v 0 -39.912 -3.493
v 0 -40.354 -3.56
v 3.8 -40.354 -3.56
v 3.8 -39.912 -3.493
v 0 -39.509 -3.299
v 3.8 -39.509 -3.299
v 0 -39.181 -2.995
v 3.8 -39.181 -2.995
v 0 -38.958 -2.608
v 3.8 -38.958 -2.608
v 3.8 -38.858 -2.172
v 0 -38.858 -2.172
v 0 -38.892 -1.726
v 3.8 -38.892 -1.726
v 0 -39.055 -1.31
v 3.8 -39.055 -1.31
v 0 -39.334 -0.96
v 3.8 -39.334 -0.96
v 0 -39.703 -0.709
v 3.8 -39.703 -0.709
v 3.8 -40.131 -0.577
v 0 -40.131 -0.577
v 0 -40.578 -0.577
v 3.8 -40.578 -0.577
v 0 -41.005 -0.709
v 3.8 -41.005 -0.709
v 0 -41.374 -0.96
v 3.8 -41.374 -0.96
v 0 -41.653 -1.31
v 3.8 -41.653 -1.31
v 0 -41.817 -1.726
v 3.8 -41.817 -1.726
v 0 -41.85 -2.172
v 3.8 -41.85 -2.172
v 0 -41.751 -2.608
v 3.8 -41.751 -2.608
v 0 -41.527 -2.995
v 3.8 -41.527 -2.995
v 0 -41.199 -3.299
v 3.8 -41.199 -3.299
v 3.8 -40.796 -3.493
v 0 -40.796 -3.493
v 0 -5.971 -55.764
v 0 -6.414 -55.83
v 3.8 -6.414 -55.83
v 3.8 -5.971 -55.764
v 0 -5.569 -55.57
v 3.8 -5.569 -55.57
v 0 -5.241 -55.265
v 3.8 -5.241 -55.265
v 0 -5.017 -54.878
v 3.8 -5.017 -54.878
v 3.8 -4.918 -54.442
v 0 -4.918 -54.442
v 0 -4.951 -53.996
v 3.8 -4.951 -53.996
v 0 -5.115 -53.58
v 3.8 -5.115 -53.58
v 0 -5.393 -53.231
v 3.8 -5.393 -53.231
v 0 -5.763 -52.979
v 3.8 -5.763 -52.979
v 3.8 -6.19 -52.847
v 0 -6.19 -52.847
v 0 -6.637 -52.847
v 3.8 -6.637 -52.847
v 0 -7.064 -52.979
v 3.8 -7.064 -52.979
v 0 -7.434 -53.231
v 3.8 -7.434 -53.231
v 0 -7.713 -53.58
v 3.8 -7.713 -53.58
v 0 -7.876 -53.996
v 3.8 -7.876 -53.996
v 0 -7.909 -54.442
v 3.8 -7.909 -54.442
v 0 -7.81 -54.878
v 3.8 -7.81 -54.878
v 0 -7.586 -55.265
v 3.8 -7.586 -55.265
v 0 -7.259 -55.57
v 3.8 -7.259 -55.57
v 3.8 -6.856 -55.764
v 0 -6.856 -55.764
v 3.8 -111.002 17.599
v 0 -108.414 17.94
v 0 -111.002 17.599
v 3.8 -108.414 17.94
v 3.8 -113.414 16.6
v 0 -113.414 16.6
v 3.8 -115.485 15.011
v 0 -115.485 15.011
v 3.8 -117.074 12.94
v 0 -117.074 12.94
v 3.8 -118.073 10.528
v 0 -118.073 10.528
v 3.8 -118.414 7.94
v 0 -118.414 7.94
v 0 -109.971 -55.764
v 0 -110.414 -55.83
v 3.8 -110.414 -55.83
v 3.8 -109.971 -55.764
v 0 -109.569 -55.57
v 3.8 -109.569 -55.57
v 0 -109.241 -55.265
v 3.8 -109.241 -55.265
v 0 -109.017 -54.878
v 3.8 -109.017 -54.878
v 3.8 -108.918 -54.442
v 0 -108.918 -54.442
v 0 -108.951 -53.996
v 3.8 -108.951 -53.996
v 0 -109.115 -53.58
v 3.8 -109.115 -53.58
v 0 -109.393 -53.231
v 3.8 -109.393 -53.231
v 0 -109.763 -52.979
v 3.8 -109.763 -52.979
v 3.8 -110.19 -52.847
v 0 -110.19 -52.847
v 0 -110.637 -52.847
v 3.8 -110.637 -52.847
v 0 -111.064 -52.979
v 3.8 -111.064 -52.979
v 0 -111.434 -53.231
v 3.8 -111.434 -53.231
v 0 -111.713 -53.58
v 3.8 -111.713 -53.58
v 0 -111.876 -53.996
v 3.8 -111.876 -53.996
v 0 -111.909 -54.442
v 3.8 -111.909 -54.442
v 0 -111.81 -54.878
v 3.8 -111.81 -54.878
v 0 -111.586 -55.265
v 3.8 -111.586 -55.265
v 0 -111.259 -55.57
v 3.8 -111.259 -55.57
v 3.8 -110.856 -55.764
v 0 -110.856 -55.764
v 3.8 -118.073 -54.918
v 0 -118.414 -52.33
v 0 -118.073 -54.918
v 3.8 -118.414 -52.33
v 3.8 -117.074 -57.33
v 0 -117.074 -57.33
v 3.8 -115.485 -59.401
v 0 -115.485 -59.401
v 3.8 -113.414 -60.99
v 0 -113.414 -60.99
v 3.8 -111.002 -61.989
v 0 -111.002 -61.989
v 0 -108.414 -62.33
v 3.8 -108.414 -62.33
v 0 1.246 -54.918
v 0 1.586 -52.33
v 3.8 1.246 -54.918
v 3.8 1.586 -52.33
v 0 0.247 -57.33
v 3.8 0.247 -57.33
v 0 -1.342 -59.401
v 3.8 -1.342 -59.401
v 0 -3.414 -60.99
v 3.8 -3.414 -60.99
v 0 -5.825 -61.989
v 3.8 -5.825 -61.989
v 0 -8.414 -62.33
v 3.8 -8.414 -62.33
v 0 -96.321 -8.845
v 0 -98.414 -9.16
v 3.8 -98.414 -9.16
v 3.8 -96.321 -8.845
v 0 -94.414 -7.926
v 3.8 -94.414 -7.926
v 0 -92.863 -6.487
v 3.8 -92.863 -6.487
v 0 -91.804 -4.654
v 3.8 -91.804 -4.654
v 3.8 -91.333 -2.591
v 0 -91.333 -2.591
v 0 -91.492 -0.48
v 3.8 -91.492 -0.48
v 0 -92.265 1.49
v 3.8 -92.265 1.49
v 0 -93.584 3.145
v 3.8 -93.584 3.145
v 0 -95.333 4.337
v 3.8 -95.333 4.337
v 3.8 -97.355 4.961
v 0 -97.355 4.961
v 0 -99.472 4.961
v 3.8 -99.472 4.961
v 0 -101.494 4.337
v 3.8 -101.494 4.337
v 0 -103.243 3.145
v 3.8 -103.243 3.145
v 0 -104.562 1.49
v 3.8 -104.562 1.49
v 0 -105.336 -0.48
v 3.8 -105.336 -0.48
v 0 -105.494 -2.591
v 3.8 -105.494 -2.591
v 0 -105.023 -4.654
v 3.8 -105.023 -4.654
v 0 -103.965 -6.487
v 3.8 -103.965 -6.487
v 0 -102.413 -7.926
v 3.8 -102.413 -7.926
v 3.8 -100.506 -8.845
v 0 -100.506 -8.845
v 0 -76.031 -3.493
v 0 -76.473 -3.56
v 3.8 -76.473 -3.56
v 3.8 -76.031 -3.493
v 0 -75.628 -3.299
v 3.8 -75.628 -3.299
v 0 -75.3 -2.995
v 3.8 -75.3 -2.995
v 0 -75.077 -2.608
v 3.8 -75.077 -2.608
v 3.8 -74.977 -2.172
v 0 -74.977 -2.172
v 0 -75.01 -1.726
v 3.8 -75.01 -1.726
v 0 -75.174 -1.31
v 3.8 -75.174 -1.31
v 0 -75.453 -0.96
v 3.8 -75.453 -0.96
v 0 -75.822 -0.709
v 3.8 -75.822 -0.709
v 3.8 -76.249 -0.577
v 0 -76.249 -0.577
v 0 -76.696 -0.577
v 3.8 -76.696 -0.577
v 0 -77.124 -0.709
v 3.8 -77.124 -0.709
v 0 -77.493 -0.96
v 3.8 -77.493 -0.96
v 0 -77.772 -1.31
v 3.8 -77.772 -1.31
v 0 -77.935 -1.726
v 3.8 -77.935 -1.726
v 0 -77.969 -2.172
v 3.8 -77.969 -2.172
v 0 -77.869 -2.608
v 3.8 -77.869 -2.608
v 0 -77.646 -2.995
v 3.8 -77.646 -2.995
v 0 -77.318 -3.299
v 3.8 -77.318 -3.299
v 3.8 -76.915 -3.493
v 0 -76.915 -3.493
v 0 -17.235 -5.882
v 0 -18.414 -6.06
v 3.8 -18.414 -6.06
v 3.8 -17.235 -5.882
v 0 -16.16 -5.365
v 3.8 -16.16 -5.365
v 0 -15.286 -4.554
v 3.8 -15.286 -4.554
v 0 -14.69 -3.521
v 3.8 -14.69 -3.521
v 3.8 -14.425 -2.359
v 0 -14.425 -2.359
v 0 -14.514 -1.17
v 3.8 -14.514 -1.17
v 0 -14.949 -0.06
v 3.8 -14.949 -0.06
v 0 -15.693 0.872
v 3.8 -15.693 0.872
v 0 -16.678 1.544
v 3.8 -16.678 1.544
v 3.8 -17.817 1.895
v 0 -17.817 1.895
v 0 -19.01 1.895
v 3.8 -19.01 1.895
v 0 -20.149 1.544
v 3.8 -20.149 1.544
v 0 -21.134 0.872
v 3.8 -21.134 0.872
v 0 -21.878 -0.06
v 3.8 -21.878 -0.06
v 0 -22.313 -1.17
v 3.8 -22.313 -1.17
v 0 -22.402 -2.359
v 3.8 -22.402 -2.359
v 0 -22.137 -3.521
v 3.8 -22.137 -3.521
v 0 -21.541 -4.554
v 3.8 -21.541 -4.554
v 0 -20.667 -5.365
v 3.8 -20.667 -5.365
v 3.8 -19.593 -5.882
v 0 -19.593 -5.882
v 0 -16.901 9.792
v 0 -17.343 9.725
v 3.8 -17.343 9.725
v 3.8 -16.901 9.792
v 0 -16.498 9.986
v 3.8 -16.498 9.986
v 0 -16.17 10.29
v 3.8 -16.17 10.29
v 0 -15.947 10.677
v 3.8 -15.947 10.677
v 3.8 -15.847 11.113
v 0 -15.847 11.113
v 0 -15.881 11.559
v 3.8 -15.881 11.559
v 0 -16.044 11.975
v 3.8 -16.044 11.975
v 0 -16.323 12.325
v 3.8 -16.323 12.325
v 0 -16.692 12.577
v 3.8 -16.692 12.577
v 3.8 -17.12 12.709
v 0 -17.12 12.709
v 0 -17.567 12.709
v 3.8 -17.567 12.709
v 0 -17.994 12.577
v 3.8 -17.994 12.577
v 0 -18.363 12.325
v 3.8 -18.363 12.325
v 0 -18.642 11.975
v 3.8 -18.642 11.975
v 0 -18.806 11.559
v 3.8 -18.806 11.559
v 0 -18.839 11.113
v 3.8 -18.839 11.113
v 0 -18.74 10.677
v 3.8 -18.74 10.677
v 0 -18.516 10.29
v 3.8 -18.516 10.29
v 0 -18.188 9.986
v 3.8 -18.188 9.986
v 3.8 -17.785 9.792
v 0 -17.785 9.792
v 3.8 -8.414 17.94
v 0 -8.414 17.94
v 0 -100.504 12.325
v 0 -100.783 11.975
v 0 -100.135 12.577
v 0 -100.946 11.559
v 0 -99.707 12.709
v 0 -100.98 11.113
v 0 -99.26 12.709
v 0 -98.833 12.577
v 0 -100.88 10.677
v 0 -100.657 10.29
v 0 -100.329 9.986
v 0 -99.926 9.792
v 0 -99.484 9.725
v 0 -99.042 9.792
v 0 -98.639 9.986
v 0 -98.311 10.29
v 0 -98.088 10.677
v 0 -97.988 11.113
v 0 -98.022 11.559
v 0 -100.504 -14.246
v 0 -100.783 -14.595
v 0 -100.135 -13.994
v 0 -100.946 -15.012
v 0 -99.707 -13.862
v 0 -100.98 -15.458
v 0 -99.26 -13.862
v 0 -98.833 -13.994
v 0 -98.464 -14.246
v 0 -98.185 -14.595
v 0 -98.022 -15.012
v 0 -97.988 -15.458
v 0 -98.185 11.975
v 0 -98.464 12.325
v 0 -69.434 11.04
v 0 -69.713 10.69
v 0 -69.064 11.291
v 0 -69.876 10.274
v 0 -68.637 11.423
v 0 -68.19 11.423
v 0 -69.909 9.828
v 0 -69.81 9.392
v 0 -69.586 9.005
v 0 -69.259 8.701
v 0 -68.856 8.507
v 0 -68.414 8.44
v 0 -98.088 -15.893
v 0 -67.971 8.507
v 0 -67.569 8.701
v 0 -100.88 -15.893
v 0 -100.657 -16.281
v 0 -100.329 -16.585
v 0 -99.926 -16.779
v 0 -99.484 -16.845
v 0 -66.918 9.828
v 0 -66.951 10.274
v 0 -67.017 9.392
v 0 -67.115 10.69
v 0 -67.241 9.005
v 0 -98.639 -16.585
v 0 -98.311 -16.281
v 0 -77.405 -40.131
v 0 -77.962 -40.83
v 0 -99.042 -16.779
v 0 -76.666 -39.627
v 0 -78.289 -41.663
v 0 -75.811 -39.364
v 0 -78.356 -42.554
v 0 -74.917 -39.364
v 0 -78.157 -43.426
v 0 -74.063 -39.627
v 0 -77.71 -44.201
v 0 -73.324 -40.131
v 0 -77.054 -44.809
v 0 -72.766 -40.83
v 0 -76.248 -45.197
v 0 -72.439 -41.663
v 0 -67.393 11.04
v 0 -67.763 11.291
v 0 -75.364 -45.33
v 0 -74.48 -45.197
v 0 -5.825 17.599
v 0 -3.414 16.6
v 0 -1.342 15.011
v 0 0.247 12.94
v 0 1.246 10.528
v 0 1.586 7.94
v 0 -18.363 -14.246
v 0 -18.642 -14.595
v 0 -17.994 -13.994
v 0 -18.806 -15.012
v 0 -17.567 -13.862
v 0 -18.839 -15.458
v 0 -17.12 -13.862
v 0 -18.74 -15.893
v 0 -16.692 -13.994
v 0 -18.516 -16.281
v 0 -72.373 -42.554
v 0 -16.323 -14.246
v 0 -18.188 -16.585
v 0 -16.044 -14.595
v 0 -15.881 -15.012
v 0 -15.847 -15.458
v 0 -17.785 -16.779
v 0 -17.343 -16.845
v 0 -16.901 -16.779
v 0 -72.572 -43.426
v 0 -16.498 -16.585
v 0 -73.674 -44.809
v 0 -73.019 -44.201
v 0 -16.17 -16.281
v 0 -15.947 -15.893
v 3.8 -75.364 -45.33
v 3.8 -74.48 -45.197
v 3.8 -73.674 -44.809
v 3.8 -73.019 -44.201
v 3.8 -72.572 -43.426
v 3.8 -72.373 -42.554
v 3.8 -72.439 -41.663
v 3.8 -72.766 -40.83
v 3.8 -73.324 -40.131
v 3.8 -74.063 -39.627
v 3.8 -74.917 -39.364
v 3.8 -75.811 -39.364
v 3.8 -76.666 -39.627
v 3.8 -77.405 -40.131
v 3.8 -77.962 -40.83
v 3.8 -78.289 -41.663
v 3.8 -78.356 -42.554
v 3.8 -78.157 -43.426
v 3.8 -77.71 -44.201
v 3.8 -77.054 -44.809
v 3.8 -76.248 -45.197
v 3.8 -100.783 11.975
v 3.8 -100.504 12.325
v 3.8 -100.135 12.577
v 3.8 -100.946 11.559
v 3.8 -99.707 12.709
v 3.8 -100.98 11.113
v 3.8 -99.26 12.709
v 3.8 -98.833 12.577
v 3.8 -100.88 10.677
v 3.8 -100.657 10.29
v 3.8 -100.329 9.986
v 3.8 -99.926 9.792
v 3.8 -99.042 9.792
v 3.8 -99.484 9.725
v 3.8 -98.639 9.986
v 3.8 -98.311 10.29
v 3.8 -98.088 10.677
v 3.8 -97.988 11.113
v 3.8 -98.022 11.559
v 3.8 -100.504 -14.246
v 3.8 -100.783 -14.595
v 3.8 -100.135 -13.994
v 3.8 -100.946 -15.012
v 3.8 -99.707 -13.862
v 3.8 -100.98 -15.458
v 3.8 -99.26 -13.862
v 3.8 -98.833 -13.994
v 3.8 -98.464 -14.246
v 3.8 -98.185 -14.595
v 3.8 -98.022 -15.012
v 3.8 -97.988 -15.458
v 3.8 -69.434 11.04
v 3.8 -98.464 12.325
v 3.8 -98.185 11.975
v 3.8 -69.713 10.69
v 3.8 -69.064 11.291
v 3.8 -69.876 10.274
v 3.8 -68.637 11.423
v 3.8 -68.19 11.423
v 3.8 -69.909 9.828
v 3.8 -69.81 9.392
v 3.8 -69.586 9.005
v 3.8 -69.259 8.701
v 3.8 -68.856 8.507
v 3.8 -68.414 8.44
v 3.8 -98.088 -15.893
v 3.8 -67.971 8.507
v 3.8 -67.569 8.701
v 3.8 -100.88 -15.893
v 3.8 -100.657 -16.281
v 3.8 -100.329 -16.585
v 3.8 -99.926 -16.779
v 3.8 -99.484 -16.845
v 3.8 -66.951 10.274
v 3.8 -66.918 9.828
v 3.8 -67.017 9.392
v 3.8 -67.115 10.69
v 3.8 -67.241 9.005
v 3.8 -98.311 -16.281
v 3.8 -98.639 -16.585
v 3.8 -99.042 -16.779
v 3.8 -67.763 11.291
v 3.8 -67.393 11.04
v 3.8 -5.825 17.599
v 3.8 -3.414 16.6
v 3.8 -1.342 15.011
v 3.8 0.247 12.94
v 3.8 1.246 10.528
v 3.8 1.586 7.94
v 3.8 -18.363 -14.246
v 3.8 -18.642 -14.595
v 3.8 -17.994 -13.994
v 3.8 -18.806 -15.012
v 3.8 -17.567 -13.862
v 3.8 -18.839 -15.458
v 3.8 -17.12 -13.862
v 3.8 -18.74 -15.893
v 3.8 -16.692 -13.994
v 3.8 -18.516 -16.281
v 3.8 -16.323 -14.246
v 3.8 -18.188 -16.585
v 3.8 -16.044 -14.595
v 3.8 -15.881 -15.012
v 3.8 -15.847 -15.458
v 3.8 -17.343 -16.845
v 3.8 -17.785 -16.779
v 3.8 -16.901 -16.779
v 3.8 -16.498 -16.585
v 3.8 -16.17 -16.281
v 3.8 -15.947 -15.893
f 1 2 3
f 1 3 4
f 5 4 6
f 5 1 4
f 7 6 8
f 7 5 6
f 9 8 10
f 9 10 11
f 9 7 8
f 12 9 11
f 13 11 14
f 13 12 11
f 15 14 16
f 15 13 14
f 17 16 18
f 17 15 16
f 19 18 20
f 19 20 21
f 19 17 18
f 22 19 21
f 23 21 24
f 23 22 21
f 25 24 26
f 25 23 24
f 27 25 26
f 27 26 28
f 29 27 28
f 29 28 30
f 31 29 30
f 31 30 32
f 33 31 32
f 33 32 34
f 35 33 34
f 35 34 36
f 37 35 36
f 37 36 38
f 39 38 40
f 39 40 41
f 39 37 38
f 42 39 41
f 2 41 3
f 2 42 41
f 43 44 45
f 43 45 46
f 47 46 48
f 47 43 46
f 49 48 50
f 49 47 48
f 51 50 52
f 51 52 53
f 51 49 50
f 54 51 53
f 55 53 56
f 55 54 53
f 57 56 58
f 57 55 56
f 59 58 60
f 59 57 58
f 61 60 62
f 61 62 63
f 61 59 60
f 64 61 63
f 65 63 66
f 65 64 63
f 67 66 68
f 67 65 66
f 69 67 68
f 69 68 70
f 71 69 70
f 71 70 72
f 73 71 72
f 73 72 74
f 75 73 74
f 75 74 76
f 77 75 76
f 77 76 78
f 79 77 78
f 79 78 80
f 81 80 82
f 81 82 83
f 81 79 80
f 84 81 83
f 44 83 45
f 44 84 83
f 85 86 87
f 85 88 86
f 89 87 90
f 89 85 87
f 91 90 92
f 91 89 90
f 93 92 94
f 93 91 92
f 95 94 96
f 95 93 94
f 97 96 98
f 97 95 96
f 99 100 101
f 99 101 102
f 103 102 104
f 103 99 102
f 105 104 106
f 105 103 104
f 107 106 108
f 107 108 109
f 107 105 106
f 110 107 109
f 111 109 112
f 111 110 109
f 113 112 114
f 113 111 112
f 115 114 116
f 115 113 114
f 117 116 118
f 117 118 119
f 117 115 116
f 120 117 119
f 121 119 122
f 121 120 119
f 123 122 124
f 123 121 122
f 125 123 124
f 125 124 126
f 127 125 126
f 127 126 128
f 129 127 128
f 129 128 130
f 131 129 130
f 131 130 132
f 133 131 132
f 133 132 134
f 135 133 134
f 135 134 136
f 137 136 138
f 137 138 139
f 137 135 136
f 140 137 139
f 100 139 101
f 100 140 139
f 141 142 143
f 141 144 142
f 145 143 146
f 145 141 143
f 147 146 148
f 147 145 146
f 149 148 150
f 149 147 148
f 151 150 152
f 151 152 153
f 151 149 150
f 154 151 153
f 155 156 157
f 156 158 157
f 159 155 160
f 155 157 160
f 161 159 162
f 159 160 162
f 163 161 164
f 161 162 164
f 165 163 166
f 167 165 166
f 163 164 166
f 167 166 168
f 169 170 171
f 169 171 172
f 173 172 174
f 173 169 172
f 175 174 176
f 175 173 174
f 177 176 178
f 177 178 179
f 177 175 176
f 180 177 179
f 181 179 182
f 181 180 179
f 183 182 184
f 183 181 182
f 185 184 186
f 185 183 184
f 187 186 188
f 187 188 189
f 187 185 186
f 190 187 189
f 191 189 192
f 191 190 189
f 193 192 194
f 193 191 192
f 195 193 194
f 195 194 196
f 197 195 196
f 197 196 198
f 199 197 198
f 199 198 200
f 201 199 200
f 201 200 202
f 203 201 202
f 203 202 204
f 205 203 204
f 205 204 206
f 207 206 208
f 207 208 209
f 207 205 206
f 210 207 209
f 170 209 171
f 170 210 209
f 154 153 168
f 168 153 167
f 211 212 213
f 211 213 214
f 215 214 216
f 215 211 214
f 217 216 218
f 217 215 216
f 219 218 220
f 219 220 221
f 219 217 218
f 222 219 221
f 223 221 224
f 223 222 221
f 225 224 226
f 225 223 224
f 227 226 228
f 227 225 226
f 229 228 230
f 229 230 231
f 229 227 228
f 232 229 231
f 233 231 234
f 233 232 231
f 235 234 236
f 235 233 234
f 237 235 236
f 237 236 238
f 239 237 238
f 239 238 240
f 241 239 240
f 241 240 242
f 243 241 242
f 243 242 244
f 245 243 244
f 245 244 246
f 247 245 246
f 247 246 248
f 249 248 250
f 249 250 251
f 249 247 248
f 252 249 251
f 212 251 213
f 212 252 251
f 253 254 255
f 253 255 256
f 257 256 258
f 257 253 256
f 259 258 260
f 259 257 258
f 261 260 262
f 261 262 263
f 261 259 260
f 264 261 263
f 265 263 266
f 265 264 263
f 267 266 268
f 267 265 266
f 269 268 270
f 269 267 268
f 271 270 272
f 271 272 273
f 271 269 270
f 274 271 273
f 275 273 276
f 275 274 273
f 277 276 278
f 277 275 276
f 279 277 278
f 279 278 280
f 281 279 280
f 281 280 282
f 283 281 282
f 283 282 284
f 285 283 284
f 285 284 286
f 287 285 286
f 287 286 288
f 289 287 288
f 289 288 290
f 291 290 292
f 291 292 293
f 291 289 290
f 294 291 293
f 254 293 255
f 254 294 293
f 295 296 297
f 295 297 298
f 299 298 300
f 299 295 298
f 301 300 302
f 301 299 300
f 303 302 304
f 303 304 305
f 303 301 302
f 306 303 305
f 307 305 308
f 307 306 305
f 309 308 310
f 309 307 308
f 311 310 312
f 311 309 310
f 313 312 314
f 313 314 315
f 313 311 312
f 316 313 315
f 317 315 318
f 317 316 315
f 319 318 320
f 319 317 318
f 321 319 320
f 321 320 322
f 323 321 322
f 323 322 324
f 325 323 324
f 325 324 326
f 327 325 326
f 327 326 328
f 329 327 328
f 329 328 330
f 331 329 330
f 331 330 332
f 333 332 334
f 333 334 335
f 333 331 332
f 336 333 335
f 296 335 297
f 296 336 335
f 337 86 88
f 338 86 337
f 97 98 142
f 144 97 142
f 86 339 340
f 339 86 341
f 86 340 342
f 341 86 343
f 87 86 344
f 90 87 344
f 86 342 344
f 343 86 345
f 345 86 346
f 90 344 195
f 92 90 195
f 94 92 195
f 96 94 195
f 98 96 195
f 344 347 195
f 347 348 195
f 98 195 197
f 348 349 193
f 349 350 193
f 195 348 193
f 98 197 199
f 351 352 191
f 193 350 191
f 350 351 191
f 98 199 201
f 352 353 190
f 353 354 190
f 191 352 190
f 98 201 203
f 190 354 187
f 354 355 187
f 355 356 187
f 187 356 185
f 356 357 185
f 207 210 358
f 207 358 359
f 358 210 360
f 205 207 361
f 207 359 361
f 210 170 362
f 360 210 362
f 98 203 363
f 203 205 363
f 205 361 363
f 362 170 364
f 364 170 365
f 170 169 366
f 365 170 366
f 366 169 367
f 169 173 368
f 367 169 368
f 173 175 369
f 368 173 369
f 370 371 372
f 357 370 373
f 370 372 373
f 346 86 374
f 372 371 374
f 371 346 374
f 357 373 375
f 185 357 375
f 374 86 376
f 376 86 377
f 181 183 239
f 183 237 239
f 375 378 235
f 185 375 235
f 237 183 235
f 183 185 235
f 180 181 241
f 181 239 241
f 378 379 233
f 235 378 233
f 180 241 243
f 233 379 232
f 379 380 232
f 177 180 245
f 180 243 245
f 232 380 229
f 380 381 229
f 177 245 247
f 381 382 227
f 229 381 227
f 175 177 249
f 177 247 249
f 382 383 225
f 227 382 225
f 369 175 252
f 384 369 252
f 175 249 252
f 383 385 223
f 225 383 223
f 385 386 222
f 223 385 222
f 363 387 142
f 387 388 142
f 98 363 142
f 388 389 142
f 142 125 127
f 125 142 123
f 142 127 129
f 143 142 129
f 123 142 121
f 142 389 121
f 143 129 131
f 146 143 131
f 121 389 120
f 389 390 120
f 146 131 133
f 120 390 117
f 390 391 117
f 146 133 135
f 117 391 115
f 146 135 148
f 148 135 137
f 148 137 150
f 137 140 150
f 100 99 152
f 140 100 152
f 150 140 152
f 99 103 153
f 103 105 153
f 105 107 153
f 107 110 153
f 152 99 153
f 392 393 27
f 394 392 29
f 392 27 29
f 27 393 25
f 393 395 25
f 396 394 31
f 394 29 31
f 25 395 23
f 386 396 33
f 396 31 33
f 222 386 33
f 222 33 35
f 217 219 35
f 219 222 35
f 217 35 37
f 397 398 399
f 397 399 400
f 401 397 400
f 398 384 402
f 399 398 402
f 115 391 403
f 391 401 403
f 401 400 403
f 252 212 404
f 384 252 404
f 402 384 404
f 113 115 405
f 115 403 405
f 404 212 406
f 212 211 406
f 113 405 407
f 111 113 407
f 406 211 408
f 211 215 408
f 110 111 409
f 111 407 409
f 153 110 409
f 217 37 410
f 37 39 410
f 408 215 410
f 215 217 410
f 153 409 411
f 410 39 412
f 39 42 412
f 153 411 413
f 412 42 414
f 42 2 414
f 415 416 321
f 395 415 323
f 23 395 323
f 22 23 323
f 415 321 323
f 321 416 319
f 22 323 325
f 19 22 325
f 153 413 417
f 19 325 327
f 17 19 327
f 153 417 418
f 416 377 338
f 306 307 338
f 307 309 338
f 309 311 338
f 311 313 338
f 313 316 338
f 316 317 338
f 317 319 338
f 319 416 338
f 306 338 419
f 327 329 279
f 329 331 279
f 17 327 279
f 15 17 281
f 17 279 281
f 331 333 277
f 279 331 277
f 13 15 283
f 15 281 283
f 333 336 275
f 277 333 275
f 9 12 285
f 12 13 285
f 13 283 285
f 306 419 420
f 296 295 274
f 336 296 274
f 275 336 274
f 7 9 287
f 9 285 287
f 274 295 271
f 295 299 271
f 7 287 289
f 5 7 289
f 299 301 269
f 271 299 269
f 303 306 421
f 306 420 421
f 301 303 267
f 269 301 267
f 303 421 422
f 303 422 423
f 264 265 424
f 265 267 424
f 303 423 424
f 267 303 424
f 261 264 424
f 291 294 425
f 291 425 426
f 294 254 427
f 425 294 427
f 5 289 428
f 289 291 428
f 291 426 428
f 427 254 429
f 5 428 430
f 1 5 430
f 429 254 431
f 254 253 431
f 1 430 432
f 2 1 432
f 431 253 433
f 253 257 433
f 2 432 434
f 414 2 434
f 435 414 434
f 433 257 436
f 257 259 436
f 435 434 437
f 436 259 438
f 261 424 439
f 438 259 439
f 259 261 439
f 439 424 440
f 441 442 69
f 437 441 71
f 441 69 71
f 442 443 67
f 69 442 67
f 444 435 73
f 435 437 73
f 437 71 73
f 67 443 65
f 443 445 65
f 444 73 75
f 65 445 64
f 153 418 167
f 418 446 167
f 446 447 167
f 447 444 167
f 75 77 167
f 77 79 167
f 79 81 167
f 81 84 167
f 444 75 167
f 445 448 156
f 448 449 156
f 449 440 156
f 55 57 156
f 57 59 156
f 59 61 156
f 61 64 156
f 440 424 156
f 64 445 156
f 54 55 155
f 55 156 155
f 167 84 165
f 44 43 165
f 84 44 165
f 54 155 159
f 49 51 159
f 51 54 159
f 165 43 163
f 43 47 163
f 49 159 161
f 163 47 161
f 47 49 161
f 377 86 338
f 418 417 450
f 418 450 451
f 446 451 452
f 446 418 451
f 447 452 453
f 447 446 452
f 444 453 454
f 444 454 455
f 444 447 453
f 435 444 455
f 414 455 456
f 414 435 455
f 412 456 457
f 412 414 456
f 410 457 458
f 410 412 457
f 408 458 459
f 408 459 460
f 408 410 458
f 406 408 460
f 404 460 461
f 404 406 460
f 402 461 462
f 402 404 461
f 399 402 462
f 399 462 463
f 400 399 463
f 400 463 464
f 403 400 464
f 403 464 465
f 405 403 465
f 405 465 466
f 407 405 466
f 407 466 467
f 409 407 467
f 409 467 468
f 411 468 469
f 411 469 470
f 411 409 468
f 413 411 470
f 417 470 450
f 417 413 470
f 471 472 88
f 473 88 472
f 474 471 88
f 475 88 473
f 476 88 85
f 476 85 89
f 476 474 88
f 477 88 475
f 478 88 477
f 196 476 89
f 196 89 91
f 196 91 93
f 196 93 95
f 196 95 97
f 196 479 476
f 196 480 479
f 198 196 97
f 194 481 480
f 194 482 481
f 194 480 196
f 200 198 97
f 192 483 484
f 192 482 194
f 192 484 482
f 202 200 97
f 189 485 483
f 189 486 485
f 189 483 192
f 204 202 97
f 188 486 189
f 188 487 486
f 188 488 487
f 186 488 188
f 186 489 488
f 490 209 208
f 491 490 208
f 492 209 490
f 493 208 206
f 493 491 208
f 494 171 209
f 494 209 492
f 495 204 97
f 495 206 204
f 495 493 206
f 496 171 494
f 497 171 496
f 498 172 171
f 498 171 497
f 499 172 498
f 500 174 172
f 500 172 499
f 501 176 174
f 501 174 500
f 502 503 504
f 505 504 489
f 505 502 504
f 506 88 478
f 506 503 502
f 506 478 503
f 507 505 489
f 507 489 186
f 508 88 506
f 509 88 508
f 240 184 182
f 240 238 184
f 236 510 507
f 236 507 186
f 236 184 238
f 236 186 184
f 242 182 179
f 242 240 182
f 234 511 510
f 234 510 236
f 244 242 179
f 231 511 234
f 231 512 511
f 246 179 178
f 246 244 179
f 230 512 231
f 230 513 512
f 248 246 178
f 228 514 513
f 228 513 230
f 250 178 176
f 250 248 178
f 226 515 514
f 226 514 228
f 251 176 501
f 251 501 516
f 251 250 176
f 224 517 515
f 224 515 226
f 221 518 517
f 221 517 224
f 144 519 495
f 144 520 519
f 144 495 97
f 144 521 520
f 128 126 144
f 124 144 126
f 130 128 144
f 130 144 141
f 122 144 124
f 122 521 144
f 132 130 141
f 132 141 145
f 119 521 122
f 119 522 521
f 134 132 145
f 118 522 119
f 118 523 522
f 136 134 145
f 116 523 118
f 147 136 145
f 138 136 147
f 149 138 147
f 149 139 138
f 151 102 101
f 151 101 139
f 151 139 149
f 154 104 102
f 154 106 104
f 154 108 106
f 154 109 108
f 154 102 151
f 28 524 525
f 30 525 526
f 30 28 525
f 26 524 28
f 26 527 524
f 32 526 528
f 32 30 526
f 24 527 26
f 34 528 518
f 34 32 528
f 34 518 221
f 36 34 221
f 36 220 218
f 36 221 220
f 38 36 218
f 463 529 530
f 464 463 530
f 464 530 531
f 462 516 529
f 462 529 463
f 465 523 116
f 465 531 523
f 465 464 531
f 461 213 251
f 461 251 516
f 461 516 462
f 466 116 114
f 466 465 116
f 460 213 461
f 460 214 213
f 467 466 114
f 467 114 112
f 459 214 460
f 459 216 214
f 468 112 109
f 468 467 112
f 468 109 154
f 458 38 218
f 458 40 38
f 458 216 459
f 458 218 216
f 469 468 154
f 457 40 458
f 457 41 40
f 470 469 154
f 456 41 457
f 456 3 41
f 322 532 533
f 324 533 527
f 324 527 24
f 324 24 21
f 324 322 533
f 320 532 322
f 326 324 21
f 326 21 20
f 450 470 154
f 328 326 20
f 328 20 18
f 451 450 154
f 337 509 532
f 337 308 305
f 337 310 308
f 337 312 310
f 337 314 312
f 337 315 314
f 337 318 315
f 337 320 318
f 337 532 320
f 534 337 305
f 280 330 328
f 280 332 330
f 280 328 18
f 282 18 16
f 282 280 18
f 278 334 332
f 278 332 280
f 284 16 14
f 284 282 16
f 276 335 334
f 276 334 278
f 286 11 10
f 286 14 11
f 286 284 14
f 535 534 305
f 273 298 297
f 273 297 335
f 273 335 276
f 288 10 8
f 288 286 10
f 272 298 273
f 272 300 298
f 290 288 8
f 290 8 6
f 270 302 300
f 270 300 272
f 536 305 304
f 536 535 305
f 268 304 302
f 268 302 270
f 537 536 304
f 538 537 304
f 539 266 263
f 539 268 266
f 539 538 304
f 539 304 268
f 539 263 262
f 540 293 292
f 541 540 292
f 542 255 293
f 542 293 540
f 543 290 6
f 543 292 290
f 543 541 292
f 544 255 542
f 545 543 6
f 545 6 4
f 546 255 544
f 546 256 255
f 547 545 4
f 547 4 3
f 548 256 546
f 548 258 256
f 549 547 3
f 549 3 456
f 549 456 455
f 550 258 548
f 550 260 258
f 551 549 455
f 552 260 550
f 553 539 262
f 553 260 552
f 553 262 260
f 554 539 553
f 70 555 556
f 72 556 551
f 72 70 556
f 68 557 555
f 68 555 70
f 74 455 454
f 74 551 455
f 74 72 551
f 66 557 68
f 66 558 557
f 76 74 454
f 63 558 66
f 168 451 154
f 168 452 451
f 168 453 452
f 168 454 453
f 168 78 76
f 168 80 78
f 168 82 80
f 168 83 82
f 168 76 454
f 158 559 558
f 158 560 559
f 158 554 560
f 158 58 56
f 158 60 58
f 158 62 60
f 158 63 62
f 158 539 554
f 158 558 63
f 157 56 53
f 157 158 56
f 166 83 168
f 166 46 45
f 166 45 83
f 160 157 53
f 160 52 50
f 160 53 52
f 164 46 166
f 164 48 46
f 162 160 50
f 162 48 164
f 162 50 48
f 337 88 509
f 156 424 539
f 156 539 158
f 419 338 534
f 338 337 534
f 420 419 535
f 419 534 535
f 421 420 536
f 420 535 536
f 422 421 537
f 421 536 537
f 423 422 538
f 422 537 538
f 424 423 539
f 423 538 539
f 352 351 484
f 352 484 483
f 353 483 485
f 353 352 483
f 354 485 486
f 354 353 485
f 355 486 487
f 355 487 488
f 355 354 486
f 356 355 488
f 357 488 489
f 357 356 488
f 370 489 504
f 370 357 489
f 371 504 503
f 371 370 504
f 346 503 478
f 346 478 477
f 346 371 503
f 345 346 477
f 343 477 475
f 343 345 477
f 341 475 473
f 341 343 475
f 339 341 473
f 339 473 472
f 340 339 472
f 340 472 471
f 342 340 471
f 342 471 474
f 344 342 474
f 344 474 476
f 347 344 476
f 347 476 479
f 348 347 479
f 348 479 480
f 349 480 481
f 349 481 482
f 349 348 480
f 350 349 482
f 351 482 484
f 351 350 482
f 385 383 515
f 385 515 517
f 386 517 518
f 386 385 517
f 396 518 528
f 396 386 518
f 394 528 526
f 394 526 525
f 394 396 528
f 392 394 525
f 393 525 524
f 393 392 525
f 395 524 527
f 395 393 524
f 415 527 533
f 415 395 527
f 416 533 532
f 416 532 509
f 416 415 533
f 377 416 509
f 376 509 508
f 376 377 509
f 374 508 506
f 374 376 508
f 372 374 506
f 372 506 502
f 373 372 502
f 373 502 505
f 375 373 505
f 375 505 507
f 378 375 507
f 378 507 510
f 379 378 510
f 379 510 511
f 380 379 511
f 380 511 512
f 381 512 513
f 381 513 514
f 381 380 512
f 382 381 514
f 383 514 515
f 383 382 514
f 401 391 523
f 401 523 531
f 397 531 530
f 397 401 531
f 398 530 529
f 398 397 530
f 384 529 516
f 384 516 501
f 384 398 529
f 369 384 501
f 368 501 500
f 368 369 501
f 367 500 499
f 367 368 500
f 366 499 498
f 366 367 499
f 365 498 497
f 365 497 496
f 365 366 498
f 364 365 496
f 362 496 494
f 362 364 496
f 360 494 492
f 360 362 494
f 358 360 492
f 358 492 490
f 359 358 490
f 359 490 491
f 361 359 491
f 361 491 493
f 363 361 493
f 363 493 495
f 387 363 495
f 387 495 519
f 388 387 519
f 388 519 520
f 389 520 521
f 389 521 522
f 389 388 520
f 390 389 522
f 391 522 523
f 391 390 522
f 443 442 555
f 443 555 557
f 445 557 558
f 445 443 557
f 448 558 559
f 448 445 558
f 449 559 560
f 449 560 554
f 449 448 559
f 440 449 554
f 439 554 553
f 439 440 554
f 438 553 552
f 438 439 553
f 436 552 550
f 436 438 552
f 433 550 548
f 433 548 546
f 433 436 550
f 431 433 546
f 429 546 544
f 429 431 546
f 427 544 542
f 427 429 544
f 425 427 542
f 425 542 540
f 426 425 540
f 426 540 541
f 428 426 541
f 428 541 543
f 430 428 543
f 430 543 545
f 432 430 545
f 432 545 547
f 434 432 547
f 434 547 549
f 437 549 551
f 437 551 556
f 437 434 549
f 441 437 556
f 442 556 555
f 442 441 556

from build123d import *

# Parameters (mm, degrees)
SKETCH1_W           = 80.27017547
SKETCH1_H           = 120
SKETCH1_R           = 4
SKETCH1_R_2         = 7.1
SKETCH1_R_3         = 3
SKETCH1_R_4         = 1.5
BOSS_EXTRUDE1_DEPTH = 3.8
FILLET1_R           = 10


with BuildPart() as part:
    # Sketch1 → Boss-Extrude1 (new body)
    with BuildSketch(Plane(origin=(0, 0, 0), x_dir=(0, 0, -1), z_dir=(1, 0, 0))):
        with Locations((22.195139842, -58.413555688)):
            Rectangle(SKETCH1_W, SKETCH1_H)
        with Locations((2.060052107, -18.413555688)):
            Circle(SKETCH1_R, mode=Mode.SUBTRACT)
        with Locations((2.060052107, -98.413555688)):
            Circle(SKETCH1_R_2, mode=Mode.SUBTRACT)
        with Locations((42.330227577, -75.364196313)):
            Circle(SKETCH1_R_3, mode=Mode.SUBTRACT)
        with Locations((54.330227577, -6.413555688)):
            Circle(SKETCH1_R_4, mode=Mode.SUBTRACT)
        with Locations((54.330227577, -110.413555688)):
            Circle(SKETCH1_R_4, mode=Mode.SUBTRACT)
        with Locations((-9.939947893, -68.413555688)):
            Circle(SKETCH1_R_4, mode=Mode.SUBTRACT)
        with Locations((2.060052107, -76.472881174)):
            Circle(SKETCH1_R_4, mode=Mode.SUBTRACT)
        with Locations((-11.225361719, -99.483892921)):
            Circle(SKETCH1_R_4, mode=Mode.SUBTRACT)
        with Locations((15.345465933, -99.483892921)):
            Circle(SKETCH1_R_4, mode=Mode.SUBTRACT)
        with Locations((15.345465933, -17.343218455)):
            Circle(SKETCH1_R_4, mode=Mode.SUBTRACT)
        with Locations((2.060052107, -40.354230201)):
            Circle(SKETCH1_R_4, mode=Mode.SUBTRACT)
        with Locations((-11.225361719, -17.343218455)):
            Circle(SKETCH1_R_4, mode=Mode.SUBTRACT)
    extrude(amount=BOSS_EXTRUDE1_DEPTH)

    # Fillet1
    fillet1_edges = [part.edges().sort_by_distance(p)[0] for p in [
        (1.9, 1.586444312, 17.939947893),
        (1.9, 1.586444312, -62.330227577),
        (1.9, -118.413555688, -62.330227577),
        (1.9, -118.413555688, 17.939947893),
    ]]
    fillet(fillet1_edges, radius=FILLET1_R)


solid = part.part
